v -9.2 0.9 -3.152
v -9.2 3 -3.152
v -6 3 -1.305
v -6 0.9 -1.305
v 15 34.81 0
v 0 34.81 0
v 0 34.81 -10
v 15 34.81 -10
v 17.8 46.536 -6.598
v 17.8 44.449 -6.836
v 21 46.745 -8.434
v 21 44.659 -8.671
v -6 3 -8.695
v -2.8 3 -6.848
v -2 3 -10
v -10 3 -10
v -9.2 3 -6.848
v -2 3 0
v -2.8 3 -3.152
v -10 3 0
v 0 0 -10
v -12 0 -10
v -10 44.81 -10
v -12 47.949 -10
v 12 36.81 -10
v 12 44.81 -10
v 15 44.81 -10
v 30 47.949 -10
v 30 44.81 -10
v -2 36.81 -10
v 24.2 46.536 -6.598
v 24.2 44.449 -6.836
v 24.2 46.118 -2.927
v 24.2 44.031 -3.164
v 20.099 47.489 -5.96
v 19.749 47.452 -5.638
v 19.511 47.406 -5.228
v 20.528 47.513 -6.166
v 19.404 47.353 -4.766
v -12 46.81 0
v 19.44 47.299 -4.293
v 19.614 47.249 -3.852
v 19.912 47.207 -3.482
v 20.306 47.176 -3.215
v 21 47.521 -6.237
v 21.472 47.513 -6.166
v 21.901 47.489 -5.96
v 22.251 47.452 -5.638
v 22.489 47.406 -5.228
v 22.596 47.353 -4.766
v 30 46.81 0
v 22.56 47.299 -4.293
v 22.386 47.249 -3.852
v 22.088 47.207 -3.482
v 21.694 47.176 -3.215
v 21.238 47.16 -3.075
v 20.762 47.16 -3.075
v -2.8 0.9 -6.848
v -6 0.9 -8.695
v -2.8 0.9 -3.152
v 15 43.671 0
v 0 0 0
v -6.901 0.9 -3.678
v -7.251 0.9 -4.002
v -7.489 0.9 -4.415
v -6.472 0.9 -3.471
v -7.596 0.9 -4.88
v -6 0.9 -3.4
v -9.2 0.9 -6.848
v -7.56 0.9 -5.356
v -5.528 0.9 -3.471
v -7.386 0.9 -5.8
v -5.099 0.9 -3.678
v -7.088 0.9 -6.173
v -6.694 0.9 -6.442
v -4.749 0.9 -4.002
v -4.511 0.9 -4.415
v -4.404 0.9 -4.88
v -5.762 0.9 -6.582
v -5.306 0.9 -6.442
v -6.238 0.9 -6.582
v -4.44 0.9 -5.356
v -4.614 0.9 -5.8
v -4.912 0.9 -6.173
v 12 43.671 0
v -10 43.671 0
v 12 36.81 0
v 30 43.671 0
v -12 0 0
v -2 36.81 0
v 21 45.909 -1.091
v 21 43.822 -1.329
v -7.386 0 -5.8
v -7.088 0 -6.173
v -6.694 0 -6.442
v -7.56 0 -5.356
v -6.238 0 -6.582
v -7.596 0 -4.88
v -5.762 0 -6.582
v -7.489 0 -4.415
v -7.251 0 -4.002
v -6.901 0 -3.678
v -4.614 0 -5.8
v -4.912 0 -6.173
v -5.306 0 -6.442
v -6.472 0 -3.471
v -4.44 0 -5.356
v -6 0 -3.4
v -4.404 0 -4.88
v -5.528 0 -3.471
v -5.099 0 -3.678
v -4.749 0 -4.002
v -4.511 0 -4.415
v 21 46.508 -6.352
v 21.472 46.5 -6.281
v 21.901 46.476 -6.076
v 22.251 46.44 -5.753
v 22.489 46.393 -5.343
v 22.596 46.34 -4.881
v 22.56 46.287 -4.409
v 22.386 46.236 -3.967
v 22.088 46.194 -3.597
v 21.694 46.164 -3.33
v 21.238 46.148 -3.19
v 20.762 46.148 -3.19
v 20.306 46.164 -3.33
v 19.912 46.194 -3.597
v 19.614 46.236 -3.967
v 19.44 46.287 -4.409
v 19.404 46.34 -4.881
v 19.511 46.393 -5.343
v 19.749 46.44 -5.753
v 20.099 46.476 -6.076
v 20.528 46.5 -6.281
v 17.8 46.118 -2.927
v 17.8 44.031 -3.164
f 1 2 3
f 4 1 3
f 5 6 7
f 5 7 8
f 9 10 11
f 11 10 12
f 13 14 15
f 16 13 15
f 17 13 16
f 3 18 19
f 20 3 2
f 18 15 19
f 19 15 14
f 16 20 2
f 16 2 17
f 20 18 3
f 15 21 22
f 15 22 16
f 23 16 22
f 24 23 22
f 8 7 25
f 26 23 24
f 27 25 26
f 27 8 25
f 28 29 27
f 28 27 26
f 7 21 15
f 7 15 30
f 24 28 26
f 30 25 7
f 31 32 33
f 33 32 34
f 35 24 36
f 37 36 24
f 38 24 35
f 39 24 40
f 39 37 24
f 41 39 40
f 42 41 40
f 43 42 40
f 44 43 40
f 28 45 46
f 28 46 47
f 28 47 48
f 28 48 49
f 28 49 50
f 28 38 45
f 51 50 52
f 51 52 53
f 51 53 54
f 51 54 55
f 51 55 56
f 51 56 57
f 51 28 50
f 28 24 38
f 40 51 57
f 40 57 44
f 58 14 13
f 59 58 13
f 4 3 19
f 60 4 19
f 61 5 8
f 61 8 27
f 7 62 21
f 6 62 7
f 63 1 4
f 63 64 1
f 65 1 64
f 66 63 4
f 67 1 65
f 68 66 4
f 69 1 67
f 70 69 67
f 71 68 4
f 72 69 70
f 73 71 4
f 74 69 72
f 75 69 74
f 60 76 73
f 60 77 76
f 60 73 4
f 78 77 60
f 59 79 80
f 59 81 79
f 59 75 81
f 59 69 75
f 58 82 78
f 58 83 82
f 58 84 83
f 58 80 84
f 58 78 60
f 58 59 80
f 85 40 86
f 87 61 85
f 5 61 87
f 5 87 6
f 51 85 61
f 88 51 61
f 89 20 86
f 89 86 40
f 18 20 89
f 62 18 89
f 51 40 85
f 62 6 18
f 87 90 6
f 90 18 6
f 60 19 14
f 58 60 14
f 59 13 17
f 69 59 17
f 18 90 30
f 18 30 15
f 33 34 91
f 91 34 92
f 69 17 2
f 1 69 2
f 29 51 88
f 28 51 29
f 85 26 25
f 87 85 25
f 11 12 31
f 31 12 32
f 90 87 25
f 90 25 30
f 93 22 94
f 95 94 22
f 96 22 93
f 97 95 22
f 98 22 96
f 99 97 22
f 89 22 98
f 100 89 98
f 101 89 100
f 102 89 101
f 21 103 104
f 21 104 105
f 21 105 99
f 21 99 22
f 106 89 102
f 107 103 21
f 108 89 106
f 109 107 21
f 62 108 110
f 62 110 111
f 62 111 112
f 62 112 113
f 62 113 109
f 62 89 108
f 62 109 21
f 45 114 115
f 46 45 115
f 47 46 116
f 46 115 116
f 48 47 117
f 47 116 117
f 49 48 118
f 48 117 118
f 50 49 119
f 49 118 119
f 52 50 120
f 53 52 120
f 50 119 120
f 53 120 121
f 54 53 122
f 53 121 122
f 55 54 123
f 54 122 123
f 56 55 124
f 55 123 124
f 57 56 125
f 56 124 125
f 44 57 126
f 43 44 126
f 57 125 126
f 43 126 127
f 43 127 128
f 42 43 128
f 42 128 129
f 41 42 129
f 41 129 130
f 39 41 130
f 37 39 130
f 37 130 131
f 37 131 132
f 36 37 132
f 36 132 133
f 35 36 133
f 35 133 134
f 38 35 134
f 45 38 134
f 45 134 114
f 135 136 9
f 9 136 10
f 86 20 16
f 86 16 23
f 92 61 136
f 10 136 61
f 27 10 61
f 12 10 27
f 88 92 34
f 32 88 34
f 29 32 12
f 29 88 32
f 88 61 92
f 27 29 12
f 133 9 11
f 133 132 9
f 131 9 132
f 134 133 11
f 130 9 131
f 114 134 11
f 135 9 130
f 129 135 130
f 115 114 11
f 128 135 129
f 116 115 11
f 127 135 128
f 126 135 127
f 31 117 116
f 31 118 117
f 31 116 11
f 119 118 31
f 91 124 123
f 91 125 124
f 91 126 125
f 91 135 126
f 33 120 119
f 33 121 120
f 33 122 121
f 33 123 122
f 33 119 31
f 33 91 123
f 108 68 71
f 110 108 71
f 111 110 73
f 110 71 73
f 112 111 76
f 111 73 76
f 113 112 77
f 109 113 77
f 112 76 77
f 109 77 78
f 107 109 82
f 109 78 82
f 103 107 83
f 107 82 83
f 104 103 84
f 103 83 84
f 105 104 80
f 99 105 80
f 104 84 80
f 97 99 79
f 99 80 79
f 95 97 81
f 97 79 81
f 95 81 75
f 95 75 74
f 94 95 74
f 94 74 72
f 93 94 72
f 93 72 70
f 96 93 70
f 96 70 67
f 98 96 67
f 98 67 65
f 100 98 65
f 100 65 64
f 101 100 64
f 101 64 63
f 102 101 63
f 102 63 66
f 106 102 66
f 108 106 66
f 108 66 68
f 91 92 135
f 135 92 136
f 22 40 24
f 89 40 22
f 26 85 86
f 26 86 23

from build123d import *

# Parameters (mm, degrees)
BOSS_EXTRUDE1_DEPTH = 10
BOSS_EXTRUDE2_REACH = 65.68
SKETCH3_R           = 1.6
CUT_EXTRUDE1_DEPTH  = 2.1
SKETCH3_2_R         = 1.6
CUT_EXTRUDE2_DEPTH  = 55.597829326
SKETCH4_R           = 1.6
CUT_EXTRUDE3_DEPTH  = 2.1
SKETCH4_4_R         = 1.6
CUT_EXTRUDE4_DEPTH  = 55.958571782


with BuildPart() as part:
    # Sketch1 → Boss-Extrude1 (new body)
    with BuildSketch(Plane.XY):
        Polygon((-12, 0), (0, 0), (0, 34.81), (15, 34.81), (15, 44.81), (30, 44.81), (30, 46.81), (-12, 46.81), align=None)
        Polygon((12, 36.81), (-2, 36.81), (-2, 3), (-10, 3), (-10, 44.81), (12, 44.81), align=None, mode=Mode.SUBTRACT)
    extrude(amount=-BOSS_EXTRUDE1_DEPTH)

    # Boss-Extrude2: up to this face of the body (flat: up to its plane)
    boss_extrude2_end = Plane(part.part.faces().sort_by_distance((-12, 23.405, -5))[0])
    # Sketch2 → Boss-Extrude2 (add, up to the picked face)
    with BuildSketch(Plane(origin=(30, 0, 0), x_dir=(0, 0, -1), z_dir=(1, 0, 0)), mode=Mode.PRIVATE) as boss_extrude2_sk1:
        Polygon((10, 47.949356083), (0, 46.81), (10, 46.81), align=None)
    boss_extrude2_tool1 = split(extrude(boss_extrude2_sk1.sketch, amount=-BOSS_EXTRUDE2_REACH, mode=Mode.PRIVATE), bisect_by=boss_extrude2_end, keep=Keep.BOTH, mode=Mode.PRIVATE)
    # Sketch2 → Boss-Extrude2 (add, up to the picked face)
    with BuildSketch(Plane(origin=(30, 0, 0), x_dir=(0, 0, -1), z_dir=(1, 0, 0)), mode=Mode.PRIVATE) as boss_extrude2_sk2:
        Polygon((10, 44.81), (0, 44.81), (0, 43.670643917), align=None)
    boss_extrude2_tool2 = split(extrude(boss_extrude2_sk2.sketch, amount=-BOSS_EXTRUDE2_REACH, mode=Mode.PRIVATE), bisect_by=boss_extrude2_end, keep=Keep.BOTH, mode=Mode.PRIVATE)
    add(boss_extrude2_tool1.solids().sort_by(Axis((30, 47.189785, -6.666667), (-1, 0, 0)))[0])
    add(boss_extrude2_tool2.solids().sort_by(Axis((30, 44.430215, -3.333333), (-1, 0, 0)))[0])

    # Sketch3 → Cut-Extrude1 (cut)
    with BuildSketch(Plane(origin=(0, 43.11100603, 4.911878697), x_dir=(1, 0, 0), z_dir=(0, -0.9935718556765883, -0.11320321376790003))):
        Polygon((24.2, -8.128485041), (21, -6.280964179), (17.8, -8.128485041), (17.8, -11.823526764), (21, -13.671047625), (24.2, -11.823526764), align=None)
        with Locations(Location((21, -9.976005902, 0), (0, 0, 270))):
            Circle(SKETCH3_R, mode=Mode.SUBTRACT)
    extrude(amount=-CUT_EXTRUDE1_DEPTH, mode=Mode.SUBTRACT)

    # Sketch3<2> → Cut-Extrude2 (cut, through all)
    with BuildSketch(Plane(origin=(0, 43.11100603, 4.911878697), x_dir=(1, 0, 0), z_dir=(0, -0.9935718556765883, -0.11320321376790003))):
        with Locations(Location((21, -9.976005902, 0), (0, 0, 270))):
            Circle(SKETCH3_2_R)
    extrude(amount=-CUT_EXTRUDE2_DEPTH, mode=Mode.SUBTRACT)

    # Sketch4 → Cut-Extrude3 (cut)
    with BuildSketch(Plane(origin=(0, 3, 0), x_dir=(1, 0, 0), z_dir=(0, 1, 0))):
        Polygon((-2.8, 3.152479139), (-2.8, 6.847520861), (-6, 8.695041723), (-9.2, 6.847520861), (-9.2, 3.152479139), (-6, 1.304958277), align=None)
        with Locations(Location((-6, 5, 0), (0, 0, 270))):
            Circle(SKETCH4_R, mode=Mode.SUBTRACT)
    extrude(amount=-CUT_EXTRUDE3_DEPTH, mode=Mode.SUBTRACT)

    # Sketch4<4> → Cut-Extrude4 (cut, through all)
    with BuildSketch(Plane(origin=(0, 3, 0), x_dir=(1, 0, 0), z_dir=(0, 1, 0))):
        with Locations(Location((-6, 5, 0), (0, 0, 270))):
            Circle(SKETCH4_4_R)
    extrude(amount=-CUT_EXTRUDE4_DEPTH, mode=Mode.SUBTRACT)


solid = part.part
